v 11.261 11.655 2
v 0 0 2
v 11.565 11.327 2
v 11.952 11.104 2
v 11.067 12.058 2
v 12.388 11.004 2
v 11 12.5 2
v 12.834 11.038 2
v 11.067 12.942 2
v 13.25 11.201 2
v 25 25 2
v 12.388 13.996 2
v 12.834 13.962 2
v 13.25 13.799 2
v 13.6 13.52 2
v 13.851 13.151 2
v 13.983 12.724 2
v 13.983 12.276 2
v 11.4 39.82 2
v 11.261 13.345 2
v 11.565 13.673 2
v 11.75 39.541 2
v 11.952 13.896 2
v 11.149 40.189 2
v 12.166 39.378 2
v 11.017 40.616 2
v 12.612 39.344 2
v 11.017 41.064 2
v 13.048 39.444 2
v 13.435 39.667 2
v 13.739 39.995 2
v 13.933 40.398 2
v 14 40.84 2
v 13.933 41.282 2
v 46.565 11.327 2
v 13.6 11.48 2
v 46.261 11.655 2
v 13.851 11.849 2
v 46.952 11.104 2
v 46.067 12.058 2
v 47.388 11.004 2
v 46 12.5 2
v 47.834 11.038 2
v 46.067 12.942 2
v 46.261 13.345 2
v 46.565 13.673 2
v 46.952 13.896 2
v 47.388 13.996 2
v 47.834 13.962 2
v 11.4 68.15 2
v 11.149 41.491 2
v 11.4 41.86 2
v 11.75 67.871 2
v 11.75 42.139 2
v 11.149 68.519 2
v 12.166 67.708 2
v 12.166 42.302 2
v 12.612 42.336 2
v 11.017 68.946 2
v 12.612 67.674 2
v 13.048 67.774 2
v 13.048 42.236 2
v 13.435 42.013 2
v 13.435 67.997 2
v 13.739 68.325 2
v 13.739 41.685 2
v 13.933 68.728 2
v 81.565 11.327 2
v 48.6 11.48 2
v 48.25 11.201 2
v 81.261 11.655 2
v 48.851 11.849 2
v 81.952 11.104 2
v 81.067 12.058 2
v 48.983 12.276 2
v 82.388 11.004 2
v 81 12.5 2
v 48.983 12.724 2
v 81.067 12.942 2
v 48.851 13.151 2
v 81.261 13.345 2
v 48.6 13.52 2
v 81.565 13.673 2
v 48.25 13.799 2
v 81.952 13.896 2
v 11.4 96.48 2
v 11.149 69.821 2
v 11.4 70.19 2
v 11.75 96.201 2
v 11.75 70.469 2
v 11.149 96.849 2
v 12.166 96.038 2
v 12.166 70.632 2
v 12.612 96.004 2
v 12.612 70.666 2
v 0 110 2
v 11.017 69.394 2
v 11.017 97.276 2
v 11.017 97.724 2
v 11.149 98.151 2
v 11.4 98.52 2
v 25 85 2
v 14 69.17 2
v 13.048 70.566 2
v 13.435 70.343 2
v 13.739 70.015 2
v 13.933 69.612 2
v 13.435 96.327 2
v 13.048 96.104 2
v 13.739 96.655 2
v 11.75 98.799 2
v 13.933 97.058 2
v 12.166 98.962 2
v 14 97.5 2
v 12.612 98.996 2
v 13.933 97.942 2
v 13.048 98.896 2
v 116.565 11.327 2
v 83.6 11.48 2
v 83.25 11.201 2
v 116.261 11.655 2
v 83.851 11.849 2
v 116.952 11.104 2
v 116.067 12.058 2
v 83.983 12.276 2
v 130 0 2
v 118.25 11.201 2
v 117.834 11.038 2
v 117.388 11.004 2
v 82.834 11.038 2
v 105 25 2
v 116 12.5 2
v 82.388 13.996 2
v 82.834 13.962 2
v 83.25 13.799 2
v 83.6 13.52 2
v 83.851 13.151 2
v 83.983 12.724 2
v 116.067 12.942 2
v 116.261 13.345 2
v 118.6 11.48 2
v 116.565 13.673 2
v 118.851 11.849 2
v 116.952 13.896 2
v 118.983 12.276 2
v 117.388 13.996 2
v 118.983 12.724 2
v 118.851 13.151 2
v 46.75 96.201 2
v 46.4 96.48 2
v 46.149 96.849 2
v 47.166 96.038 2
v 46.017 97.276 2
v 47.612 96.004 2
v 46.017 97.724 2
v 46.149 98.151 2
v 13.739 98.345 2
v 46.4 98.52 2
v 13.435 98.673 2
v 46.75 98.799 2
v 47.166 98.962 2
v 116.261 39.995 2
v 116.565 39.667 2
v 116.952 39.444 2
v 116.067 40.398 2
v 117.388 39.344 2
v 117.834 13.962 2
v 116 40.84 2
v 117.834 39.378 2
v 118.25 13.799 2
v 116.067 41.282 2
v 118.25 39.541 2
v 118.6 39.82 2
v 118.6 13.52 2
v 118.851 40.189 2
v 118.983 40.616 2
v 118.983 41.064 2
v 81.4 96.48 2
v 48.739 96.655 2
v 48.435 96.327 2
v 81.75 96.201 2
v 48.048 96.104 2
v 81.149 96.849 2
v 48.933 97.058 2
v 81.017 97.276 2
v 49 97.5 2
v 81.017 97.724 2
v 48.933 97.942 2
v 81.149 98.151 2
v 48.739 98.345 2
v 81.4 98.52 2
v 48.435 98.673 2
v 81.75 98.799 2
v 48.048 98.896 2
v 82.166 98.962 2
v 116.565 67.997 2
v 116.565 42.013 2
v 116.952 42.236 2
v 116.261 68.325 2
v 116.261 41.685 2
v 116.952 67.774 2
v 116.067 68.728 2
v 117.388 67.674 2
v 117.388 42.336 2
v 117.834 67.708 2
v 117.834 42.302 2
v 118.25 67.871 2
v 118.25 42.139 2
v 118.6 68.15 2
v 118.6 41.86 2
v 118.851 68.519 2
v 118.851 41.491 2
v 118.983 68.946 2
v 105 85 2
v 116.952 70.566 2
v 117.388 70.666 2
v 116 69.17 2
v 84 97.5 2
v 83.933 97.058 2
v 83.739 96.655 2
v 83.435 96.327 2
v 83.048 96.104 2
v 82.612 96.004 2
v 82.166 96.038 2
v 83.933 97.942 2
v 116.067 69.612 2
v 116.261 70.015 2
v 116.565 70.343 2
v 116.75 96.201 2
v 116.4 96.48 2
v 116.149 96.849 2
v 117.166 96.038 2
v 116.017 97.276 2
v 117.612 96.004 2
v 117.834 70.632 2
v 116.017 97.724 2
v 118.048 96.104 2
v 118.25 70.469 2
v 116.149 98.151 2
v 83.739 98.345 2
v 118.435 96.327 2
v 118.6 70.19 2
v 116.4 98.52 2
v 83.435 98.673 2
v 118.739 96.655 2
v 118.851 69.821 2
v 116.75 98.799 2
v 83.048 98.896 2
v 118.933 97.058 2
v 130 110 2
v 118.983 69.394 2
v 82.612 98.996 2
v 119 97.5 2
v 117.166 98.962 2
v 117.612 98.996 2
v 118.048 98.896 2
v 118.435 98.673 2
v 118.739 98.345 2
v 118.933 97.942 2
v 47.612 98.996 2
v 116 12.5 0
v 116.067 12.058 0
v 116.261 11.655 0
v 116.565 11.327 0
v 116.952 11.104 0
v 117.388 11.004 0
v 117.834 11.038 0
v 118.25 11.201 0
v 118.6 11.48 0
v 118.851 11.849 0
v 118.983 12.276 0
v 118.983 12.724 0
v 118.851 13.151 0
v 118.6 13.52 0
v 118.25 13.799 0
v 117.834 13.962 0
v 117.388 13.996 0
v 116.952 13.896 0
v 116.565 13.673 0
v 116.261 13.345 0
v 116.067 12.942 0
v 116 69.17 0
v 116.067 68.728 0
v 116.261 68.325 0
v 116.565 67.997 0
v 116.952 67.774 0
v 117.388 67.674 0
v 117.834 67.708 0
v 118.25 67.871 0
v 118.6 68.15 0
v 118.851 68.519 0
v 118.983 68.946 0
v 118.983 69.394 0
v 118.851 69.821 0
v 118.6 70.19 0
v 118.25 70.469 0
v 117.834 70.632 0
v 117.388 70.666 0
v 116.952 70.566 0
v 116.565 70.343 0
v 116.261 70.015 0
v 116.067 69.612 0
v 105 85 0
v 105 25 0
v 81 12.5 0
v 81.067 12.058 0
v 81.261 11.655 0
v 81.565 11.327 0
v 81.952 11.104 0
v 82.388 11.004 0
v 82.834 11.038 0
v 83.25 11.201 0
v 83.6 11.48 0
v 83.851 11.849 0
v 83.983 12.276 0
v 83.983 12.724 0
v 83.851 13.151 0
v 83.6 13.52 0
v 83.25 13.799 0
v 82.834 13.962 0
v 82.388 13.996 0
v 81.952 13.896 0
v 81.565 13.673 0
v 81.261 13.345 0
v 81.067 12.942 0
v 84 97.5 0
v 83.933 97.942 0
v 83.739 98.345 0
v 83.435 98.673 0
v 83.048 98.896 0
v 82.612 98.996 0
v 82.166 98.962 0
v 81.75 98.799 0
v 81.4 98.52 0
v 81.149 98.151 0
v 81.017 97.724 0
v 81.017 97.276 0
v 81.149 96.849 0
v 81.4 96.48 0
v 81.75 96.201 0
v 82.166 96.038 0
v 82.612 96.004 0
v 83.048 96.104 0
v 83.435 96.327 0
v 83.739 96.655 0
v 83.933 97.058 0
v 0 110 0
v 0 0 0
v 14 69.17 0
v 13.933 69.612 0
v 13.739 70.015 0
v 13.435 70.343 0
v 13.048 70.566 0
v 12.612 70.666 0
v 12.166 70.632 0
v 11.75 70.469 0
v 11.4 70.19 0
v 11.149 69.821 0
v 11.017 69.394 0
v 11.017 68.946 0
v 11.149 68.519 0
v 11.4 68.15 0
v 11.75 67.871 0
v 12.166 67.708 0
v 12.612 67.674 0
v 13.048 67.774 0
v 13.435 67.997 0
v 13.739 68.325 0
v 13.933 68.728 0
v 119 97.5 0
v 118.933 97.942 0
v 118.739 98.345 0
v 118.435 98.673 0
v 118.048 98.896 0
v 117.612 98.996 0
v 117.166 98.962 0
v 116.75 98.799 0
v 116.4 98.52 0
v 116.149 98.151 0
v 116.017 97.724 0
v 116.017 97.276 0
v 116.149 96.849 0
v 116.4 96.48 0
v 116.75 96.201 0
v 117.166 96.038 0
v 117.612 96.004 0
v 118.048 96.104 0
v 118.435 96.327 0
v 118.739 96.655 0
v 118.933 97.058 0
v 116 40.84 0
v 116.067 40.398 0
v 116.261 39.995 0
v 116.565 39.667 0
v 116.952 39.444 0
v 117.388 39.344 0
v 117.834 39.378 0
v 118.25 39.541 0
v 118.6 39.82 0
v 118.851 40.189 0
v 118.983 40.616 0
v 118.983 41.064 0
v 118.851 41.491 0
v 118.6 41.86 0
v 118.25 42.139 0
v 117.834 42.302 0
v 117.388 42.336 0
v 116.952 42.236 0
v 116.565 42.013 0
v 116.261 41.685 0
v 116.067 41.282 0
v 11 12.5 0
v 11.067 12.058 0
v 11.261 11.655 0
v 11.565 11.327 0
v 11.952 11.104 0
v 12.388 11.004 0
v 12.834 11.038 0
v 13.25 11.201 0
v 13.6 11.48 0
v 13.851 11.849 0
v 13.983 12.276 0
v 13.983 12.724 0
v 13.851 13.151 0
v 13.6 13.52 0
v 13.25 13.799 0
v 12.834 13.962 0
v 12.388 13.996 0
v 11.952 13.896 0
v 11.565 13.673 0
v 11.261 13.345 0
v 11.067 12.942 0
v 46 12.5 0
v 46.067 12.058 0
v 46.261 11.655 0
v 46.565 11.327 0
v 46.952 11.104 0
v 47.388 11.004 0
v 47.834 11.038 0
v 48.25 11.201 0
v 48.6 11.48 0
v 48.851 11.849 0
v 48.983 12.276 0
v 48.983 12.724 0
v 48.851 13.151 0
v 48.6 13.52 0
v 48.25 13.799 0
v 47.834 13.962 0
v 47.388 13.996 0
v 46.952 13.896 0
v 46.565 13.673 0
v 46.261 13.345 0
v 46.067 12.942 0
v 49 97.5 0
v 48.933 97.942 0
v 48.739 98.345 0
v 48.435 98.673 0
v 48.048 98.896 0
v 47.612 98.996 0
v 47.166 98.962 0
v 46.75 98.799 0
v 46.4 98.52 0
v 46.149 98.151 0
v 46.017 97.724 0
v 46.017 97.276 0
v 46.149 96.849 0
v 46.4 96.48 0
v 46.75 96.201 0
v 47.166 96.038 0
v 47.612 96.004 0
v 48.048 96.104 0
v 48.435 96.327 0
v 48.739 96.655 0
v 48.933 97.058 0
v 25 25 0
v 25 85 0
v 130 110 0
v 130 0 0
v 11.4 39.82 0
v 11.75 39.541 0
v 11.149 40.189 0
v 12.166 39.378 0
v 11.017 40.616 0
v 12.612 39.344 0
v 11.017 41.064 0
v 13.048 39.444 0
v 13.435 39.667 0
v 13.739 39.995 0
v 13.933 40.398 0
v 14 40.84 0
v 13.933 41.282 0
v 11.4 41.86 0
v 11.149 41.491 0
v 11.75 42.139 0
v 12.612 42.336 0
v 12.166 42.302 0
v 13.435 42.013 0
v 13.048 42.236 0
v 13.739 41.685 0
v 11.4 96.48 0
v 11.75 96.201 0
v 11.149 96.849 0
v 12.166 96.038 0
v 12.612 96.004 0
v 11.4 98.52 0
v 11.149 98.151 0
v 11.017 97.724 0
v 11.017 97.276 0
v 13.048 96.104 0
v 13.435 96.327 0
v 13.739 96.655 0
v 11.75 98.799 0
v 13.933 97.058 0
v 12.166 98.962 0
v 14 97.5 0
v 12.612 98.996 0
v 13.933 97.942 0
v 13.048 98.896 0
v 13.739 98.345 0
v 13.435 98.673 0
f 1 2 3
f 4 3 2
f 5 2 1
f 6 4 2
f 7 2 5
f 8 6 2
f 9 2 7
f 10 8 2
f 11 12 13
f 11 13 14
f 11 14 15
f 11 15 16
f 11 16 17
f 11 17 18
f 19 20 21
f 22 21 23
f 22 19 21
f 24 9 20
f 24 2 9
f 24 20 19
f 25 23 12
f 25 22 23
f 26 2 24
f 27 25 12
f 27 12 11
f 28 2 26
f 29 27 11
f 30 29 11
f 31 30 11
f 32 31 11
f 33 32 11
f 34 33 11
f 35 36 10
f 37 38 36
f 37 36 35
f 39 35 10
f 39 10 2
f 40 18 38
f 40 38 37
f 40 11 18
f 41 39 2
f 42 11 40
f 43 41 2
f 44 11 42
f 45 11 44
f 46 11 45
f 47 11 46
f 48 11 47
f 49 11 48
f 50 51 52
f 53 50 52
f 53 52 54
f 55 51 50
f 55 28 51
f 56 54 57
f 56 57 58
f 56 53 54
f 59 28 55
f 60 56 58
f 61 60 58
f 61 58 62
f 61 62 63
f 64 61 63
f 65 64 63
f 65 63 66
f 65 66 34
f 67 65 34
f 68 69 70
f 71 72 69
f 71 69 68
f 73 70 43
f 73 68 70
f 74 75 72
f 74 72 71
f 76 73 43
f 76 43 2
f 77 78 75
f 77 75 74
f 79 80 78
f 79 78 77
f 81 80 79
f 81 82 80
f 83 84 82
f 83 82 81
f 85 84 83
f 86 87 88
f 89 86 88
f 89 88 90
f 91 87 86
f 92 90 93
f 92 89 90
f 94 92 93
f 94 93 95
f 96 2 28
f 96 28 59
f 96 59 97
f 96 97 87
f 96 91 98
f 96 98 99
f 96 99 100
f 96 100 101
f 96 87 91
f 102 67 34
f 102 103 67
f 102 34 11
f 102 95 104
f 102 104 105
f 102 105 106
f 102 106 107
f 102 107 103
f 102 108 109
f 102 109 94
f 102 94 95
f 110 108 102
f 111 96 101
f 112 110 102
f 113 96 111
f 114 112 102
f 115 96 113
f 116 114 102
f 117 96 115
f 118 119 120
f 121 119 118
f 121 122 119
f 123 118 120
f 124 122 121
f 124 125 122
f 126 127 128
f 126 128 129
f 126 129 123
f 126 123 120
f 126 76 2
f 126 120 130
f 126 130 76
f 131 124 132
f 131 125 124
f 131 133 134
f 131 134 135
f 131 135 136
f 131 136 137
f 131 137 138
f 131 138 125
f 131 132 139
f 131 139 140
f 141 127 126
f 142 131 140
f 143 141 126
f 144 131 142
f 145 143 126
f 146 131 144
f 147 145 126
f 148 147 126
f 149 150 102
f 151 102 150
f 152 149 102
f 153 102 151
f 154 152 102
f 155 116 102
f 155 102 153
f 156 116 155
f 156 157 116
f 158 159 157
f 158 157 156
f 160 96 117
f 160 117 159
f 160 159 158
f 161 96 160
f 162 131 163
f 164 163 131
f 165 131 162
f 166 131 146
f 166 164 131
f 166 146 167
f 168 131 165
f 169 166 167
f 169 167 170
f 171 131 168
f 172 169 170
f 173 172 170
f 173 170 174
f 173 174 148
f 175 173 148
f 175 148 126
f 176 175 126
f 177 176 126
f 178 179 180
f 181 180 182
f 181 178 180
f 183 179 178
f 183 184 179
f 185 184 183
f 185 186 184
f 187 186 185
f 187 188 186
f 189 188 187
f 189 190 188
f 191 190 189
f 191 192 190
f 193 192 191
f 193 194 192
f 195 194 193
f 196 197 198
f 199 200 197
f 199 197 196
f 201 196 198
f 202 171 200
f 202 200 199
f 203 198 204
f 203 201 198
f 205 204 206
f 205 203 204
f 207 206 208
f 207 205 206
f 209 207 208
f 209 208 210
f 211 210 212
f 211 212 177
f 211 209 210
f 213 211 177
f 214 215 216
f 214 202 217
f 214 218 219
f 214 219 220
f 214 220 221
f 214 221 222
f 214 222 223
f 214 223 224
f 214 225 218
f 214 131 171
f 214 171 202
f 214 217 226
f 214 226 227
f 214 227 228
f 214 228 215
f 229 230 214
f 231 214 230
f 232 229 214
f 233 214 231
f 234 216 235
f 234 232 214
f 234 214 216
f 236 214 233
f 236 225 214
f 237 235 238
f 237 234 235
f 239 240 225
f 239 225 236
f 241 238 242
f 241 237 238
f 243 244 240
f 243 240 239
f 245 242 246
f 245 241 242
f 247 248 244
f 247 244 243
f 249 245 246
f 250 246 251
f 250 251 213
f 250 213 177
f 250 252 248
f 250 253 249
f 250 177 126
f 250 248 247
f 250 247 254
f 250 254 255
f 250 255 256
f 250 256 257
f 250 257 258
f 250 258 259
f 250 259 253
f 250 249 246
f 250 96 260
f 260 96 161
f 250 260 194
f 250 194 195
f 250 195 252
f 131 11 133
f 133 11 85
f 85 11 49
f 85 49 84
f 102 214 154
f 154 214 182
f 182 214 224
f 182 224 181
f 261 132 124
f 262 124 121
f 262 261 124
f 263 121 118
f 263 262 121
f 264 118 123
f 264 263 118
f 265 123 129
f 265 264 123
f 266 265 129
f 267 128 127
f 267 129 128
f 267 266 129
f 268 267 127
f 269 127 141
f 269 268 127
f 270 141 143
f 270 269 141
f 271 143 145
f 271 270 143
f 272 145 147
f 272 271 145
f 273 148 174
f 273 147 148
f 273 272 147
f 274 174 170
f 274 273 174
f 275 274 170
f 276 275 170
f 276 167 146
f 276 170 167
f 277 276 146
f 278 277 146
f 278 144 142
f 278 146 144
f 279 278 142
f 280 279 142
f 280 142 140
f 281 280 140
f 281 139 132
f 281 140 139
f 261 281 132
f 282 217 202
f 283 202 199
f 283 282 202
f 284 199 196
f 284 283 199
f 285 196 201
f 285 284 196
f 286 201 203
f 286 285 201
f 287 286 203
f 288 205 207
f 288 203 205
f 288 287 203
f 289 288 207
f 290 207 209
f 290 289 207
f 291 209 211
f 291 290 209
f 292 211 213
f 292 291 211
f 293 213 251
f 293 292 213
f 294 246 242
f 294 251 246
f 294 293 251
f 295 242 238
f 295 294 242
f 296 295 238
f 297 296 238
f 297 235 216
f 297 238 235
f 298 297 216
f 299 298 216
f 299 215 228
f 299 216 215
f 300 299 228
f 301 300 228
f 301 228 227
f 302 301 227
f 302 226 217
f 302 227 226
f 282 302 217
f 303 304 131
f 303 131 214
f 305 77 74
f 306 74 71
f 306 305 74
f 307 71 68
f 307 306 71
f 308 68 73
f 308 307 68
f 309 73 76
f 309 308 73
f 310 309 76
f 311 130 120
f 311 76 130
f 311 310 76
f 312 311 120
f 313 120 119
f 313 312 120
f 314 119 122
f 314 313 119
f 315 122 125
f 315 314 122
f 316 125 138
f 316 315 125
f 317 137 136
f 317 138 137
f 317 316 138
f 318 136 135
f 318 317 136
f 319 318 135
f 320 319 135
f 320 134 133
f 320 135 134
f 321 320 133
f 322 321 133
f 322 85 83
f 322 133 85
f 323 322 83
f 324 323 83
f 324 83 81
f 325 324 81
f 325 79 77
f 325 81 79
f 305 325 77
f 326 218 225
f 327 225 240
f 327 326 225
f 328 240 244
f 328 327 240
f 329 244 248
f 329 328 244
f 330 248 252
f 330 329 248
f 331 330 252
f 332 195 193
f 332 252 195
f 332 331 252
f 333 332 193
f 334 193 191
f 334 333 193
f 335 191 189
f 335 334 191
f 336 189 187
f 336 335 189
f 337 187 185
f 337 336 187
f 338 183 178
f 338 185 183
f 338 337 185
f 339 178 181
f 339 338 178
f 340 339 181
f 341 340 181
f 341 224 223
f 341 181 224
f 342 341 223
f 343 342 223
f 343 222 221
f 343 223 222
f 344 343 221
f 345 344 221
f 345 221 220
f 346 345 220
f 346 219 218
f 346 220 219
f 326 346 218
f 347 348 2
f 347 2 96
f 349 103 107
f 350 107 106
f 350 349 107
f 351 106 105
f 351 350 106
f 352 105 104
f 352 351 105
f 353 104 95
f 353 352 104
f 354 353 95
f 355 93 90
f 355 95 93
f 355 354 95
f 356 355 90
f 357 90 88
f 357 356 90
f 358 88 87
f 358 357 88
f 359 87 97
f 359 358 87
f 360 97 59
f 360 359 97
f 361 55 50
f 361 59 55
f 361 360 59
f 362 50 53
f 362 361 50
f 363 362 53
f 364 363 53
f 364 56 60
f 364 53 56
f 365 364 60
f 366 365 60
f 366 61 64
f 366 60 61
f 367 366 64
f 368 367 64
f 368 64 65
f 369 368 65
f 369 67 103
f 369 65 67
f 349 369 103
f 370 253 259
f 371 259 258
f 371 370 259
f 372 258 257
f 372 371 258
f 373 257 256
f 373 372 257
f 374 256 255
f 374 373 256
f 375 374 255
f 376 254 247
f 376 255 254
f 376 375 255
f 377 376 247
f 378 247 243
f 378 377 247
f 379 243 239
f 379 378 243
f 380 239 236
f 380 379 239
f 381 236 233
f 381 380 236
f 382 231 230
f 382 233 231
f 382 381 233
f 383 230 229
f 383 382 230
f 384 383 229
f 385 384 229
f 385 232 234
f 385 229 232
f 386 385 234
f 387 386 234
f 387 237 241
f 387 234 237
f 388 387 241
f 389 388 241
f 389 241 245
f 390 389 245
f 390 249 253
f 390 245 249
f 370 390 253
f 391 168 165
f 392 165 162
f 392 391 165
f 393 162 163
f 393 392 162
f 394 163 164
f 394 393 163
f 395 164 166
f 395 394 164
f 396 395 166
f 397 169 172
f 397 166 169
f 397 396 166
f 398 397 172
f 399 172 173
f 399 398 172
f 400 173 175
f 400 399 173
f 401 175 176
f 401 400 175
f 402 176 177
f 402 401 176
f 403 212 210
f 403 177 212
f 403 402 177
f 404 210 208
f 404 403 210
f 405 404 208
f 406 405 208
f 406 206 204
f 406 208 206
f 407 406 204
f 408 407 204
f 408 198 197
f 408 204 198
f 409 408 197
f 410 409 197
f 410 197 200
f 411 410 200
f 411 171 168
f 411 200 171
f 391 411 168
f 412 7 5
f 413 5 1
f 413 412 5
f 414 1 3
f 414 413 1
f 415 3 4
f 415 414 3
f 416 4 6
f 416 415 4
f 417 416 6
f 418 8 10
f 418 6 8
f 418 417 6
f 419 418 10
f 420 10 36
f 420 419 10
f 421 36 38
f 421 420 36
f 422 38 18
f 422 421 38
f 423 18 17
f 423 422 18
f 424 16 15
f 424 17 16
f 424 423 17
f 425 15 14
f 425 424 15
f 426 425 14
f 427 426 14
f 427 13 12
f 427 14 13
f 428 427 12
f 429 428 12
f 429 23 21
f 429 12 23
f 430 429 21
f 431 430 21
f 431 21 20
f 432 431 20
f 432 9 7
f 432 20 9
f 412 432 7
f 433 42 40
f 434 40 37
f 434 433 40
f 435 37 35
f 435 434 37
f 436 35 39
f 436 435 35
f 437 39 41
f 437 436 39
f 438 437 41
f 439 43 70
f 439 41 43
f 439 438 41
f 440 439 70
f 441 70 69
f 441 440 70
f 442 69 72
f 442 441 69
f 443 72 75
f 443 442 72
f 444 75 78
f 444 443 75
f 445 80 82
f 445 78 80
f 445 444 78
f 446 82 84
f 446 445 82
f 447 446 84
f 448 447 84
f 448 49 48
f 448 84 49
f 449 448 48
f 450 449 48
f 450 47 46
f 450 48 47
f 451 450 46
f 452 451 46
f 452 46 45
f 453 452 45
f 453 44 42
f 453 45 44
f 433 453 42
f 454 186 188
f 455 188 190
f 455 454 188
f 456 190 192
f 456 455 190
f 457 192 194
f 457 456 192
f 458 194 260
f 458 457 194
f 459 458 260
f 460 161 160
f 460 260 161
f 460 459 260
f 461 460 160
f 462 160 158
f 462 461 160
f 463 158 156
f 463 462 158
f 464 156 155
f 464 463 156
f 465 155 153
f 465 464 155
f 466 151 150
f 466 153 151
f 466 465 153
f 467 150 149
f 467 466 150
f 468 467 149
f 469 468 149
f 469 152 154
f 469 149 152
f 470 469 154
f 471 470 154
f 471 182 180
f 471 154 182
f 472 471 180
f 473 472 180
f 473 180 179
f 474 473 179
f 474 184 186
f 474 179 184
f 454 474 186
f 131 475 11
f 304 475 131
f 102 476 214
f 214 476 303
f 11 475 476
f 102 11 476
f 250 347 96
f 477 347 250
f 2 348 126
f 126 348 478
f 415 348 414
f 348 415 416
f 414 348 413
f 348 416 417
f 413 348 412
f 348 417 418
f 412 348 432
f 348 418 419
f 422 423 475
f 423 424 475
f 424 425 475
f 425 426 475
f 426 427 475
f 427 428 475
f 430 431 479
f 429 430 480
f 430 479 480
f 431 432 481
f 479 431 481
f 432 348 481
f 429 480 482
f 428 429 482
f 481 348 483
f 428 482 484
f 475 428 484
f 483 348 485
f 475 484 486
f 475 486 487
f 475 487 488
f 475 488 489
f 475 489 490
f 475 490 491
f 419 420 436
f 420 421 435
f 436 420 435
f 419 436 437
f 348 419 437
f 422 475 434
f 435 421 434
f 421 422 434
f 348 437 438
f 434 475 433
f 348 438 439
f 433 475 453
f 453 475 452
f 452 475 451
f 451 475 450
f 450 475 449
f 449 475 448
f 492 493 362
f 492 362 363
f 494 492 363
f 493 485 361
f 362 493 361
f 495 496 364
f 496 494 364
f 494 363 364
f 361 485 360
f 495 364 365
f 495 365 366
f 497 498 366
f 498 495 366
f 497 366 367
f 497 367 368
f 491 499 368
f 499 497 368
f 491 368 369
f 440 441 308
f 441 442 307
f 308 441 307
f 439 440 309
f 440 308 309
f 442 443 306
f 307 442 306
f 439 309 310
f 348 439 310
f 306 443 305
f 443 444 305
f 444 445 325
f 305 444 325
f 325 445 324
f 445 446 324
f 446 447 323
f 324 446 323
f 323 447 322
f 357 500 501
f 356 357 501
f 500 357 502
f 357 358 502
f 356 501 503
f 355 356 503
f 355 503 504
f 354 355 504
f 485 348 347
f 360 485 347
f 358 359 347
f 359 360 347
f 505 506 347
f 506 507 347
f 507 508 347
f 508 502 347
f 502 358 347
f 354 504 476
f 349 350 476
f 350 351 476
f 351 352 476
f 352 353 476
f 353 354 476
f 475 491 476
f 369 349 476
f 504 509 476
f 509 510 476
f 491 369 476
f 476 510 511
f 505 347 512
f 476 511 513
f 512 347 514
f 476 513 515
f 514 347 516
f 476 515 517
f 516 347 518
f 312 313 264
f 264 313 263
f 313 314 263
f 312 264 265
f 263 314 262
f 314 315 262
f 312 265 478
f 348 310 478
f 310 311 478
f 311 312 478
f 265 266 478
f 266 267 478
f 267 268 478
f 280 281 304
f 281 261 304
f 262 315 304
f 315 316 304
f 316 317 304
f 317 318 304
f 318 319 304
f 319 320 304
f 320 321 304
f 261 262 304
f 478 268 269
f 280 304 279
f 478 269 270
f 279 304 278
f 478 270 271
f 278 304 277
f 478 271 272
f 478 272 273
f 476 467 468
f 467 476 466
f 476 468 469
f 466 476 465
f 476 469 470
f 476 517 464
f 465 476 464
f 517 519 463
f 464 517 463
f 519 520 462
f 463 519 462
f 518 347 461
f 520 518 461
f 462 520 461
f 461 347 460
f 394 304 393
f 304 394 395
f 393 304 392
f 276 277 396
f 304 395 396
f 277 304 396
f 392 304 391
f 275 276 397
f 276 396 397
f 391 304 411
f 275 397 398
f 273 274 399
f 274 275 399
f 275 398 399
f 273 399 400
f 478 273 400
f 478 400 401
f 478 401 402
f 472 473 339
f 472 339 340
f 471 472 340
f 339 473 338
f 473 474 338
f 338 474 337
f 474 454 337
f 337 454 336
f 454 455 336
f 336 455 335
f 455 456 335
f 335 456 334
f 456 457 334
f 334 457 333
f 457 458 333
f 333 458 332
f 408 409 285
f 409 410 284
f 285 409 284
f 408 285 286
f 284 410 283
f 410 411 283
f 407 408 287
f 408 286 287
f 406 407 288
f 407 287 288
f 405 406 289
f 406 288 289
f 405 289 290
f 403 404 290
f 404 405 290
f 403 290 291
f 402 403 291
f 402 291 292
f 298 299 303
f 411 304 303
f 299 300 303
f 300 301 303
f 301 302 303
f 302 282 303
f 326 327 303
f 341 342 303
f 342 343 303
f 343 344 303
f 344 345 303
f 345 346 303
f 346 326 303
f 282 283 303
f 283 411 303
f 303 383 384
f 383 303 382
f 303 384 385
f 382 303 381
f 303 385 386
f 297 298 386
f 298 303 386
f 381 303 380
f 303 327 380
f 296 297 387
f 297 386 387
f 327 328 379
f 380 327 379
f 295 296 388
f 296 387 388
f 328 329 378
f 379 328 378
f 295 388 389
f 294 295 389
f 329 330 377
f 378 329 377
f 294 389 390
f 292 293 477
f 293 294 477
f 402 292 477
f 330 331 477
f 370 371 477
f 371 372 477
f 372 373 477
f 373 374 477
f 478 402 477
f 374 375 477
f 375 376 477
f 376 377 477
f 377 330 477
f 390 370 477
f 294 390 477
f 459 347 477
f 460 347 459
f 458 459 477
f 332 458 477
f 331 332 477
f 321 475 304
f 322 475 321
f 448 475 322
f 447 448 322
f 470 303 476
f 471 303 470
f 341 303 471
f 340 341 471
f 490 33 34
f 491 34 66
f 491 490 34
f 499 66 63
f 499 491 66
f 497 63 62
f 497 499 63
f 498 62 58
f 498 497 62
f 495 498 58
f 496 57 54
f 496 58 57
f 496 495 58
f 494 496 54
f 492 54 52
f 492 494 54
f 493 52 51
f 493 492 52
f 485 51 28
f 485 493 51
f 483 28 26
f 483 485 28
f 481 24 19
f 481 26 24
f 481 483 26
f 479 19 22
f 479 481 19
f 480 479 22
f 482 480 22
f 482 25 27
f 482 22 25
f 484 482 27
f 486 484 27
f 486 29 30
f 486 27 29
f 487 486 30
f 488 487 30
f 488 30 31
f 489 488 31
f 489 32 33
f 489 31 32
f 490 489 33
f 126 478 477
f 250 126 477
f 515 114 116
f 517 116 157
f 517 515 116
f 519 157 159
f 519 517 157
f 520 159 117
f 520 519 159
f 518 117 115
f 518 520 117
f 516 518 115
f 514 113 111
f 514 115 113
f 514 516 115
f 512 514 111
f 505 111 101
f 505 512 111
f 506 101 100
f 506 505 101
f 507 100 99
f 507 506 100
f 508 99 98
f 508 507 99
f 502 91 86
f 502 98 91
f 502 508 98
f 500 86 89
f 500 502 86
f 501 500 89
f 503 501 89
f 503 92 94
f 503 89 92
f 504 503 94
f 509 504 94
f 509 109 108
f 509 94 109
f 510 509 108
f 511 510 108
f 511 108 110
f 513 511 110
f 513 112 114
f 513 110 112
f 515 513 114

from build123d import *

# Parameters (mm, degrees)
CROQUIS1_W              = 130
CROQUIS1_H              = 110
CROQUIS1_W_2            = 80
CROQUIS1_H_2            = 60
SALIENTE_EXTRUIR1_DEPTH = 2
CROQUIS2_R              = 1.5
CORTAR_EXTRUIR2_DEPTH   = 171.305607659


with BuildPart() as part:
    # Croquis1 → Saliente-Extruir1 (new body)
    with BuildSketch(Plane.XY):
        with Locations((65, 55)):
            Rectangle(CROQUIS1_W, CROQUIS1_H)
        with Locations((65, 55)):
            Rectangle(CROQUIS1_W_2, CROQUIS1_H_2, mode=Mode.SUBTRACT)
    extrude(amount=SALIENTE_EXTRUIR1_DEPTH)

    # Croquis2 → Cortar-Extruir2 (cut, through all)
    with BuildSketch(Plane.XY):
        with Locations((12.5, 97.5)):
            Circle(CROQUIS2_R)
        with Locations((47.5, 97.5)):
            Circle(CROQUIS2_R)
        with Locations((82.5, 97.5)):
            Circle(CROQUIS2_R)
        with Locations((117.5, 97.5)):
            Circle(CROQUIS2_R)
        with Locations((12.5, 69.17)):
            Circle(CROQUIS2_R)
        with Locations((12.5, 40.84)):
            Circle(CROQUIS2_R)
        with Locations(Location((117.5, 12.5, 0), (0, 0, 180))):
            Circle(CROQUIS2_R)
        with Locations(Location((82.5, 12.5, 0), (0, 0, 180))):
            Circle(CROQUIS2_R)
        with Locations(Location((47.5, 12.5, 0), (0, 0, 180))):
            Circle(CROQUIS2_R)
        with Locations(Location((12.5, 12.5, 0), (0, 0, 180))):
            Circle(CROQUIS2_R)
        with Locations(Location((117.5, 40.84, 0), (0, 0, 180))):
            Circle(CROQUIS2_R)
        with Locations(Location((117.5, 69.17, 0), (0, 0, 180))):
            Circle(CROQUIS2_R)
    extrude(amount=CORTAR_EXTRUIR2_DEPTH, mode=Mode.SUBTRACT)


solid = part.part
